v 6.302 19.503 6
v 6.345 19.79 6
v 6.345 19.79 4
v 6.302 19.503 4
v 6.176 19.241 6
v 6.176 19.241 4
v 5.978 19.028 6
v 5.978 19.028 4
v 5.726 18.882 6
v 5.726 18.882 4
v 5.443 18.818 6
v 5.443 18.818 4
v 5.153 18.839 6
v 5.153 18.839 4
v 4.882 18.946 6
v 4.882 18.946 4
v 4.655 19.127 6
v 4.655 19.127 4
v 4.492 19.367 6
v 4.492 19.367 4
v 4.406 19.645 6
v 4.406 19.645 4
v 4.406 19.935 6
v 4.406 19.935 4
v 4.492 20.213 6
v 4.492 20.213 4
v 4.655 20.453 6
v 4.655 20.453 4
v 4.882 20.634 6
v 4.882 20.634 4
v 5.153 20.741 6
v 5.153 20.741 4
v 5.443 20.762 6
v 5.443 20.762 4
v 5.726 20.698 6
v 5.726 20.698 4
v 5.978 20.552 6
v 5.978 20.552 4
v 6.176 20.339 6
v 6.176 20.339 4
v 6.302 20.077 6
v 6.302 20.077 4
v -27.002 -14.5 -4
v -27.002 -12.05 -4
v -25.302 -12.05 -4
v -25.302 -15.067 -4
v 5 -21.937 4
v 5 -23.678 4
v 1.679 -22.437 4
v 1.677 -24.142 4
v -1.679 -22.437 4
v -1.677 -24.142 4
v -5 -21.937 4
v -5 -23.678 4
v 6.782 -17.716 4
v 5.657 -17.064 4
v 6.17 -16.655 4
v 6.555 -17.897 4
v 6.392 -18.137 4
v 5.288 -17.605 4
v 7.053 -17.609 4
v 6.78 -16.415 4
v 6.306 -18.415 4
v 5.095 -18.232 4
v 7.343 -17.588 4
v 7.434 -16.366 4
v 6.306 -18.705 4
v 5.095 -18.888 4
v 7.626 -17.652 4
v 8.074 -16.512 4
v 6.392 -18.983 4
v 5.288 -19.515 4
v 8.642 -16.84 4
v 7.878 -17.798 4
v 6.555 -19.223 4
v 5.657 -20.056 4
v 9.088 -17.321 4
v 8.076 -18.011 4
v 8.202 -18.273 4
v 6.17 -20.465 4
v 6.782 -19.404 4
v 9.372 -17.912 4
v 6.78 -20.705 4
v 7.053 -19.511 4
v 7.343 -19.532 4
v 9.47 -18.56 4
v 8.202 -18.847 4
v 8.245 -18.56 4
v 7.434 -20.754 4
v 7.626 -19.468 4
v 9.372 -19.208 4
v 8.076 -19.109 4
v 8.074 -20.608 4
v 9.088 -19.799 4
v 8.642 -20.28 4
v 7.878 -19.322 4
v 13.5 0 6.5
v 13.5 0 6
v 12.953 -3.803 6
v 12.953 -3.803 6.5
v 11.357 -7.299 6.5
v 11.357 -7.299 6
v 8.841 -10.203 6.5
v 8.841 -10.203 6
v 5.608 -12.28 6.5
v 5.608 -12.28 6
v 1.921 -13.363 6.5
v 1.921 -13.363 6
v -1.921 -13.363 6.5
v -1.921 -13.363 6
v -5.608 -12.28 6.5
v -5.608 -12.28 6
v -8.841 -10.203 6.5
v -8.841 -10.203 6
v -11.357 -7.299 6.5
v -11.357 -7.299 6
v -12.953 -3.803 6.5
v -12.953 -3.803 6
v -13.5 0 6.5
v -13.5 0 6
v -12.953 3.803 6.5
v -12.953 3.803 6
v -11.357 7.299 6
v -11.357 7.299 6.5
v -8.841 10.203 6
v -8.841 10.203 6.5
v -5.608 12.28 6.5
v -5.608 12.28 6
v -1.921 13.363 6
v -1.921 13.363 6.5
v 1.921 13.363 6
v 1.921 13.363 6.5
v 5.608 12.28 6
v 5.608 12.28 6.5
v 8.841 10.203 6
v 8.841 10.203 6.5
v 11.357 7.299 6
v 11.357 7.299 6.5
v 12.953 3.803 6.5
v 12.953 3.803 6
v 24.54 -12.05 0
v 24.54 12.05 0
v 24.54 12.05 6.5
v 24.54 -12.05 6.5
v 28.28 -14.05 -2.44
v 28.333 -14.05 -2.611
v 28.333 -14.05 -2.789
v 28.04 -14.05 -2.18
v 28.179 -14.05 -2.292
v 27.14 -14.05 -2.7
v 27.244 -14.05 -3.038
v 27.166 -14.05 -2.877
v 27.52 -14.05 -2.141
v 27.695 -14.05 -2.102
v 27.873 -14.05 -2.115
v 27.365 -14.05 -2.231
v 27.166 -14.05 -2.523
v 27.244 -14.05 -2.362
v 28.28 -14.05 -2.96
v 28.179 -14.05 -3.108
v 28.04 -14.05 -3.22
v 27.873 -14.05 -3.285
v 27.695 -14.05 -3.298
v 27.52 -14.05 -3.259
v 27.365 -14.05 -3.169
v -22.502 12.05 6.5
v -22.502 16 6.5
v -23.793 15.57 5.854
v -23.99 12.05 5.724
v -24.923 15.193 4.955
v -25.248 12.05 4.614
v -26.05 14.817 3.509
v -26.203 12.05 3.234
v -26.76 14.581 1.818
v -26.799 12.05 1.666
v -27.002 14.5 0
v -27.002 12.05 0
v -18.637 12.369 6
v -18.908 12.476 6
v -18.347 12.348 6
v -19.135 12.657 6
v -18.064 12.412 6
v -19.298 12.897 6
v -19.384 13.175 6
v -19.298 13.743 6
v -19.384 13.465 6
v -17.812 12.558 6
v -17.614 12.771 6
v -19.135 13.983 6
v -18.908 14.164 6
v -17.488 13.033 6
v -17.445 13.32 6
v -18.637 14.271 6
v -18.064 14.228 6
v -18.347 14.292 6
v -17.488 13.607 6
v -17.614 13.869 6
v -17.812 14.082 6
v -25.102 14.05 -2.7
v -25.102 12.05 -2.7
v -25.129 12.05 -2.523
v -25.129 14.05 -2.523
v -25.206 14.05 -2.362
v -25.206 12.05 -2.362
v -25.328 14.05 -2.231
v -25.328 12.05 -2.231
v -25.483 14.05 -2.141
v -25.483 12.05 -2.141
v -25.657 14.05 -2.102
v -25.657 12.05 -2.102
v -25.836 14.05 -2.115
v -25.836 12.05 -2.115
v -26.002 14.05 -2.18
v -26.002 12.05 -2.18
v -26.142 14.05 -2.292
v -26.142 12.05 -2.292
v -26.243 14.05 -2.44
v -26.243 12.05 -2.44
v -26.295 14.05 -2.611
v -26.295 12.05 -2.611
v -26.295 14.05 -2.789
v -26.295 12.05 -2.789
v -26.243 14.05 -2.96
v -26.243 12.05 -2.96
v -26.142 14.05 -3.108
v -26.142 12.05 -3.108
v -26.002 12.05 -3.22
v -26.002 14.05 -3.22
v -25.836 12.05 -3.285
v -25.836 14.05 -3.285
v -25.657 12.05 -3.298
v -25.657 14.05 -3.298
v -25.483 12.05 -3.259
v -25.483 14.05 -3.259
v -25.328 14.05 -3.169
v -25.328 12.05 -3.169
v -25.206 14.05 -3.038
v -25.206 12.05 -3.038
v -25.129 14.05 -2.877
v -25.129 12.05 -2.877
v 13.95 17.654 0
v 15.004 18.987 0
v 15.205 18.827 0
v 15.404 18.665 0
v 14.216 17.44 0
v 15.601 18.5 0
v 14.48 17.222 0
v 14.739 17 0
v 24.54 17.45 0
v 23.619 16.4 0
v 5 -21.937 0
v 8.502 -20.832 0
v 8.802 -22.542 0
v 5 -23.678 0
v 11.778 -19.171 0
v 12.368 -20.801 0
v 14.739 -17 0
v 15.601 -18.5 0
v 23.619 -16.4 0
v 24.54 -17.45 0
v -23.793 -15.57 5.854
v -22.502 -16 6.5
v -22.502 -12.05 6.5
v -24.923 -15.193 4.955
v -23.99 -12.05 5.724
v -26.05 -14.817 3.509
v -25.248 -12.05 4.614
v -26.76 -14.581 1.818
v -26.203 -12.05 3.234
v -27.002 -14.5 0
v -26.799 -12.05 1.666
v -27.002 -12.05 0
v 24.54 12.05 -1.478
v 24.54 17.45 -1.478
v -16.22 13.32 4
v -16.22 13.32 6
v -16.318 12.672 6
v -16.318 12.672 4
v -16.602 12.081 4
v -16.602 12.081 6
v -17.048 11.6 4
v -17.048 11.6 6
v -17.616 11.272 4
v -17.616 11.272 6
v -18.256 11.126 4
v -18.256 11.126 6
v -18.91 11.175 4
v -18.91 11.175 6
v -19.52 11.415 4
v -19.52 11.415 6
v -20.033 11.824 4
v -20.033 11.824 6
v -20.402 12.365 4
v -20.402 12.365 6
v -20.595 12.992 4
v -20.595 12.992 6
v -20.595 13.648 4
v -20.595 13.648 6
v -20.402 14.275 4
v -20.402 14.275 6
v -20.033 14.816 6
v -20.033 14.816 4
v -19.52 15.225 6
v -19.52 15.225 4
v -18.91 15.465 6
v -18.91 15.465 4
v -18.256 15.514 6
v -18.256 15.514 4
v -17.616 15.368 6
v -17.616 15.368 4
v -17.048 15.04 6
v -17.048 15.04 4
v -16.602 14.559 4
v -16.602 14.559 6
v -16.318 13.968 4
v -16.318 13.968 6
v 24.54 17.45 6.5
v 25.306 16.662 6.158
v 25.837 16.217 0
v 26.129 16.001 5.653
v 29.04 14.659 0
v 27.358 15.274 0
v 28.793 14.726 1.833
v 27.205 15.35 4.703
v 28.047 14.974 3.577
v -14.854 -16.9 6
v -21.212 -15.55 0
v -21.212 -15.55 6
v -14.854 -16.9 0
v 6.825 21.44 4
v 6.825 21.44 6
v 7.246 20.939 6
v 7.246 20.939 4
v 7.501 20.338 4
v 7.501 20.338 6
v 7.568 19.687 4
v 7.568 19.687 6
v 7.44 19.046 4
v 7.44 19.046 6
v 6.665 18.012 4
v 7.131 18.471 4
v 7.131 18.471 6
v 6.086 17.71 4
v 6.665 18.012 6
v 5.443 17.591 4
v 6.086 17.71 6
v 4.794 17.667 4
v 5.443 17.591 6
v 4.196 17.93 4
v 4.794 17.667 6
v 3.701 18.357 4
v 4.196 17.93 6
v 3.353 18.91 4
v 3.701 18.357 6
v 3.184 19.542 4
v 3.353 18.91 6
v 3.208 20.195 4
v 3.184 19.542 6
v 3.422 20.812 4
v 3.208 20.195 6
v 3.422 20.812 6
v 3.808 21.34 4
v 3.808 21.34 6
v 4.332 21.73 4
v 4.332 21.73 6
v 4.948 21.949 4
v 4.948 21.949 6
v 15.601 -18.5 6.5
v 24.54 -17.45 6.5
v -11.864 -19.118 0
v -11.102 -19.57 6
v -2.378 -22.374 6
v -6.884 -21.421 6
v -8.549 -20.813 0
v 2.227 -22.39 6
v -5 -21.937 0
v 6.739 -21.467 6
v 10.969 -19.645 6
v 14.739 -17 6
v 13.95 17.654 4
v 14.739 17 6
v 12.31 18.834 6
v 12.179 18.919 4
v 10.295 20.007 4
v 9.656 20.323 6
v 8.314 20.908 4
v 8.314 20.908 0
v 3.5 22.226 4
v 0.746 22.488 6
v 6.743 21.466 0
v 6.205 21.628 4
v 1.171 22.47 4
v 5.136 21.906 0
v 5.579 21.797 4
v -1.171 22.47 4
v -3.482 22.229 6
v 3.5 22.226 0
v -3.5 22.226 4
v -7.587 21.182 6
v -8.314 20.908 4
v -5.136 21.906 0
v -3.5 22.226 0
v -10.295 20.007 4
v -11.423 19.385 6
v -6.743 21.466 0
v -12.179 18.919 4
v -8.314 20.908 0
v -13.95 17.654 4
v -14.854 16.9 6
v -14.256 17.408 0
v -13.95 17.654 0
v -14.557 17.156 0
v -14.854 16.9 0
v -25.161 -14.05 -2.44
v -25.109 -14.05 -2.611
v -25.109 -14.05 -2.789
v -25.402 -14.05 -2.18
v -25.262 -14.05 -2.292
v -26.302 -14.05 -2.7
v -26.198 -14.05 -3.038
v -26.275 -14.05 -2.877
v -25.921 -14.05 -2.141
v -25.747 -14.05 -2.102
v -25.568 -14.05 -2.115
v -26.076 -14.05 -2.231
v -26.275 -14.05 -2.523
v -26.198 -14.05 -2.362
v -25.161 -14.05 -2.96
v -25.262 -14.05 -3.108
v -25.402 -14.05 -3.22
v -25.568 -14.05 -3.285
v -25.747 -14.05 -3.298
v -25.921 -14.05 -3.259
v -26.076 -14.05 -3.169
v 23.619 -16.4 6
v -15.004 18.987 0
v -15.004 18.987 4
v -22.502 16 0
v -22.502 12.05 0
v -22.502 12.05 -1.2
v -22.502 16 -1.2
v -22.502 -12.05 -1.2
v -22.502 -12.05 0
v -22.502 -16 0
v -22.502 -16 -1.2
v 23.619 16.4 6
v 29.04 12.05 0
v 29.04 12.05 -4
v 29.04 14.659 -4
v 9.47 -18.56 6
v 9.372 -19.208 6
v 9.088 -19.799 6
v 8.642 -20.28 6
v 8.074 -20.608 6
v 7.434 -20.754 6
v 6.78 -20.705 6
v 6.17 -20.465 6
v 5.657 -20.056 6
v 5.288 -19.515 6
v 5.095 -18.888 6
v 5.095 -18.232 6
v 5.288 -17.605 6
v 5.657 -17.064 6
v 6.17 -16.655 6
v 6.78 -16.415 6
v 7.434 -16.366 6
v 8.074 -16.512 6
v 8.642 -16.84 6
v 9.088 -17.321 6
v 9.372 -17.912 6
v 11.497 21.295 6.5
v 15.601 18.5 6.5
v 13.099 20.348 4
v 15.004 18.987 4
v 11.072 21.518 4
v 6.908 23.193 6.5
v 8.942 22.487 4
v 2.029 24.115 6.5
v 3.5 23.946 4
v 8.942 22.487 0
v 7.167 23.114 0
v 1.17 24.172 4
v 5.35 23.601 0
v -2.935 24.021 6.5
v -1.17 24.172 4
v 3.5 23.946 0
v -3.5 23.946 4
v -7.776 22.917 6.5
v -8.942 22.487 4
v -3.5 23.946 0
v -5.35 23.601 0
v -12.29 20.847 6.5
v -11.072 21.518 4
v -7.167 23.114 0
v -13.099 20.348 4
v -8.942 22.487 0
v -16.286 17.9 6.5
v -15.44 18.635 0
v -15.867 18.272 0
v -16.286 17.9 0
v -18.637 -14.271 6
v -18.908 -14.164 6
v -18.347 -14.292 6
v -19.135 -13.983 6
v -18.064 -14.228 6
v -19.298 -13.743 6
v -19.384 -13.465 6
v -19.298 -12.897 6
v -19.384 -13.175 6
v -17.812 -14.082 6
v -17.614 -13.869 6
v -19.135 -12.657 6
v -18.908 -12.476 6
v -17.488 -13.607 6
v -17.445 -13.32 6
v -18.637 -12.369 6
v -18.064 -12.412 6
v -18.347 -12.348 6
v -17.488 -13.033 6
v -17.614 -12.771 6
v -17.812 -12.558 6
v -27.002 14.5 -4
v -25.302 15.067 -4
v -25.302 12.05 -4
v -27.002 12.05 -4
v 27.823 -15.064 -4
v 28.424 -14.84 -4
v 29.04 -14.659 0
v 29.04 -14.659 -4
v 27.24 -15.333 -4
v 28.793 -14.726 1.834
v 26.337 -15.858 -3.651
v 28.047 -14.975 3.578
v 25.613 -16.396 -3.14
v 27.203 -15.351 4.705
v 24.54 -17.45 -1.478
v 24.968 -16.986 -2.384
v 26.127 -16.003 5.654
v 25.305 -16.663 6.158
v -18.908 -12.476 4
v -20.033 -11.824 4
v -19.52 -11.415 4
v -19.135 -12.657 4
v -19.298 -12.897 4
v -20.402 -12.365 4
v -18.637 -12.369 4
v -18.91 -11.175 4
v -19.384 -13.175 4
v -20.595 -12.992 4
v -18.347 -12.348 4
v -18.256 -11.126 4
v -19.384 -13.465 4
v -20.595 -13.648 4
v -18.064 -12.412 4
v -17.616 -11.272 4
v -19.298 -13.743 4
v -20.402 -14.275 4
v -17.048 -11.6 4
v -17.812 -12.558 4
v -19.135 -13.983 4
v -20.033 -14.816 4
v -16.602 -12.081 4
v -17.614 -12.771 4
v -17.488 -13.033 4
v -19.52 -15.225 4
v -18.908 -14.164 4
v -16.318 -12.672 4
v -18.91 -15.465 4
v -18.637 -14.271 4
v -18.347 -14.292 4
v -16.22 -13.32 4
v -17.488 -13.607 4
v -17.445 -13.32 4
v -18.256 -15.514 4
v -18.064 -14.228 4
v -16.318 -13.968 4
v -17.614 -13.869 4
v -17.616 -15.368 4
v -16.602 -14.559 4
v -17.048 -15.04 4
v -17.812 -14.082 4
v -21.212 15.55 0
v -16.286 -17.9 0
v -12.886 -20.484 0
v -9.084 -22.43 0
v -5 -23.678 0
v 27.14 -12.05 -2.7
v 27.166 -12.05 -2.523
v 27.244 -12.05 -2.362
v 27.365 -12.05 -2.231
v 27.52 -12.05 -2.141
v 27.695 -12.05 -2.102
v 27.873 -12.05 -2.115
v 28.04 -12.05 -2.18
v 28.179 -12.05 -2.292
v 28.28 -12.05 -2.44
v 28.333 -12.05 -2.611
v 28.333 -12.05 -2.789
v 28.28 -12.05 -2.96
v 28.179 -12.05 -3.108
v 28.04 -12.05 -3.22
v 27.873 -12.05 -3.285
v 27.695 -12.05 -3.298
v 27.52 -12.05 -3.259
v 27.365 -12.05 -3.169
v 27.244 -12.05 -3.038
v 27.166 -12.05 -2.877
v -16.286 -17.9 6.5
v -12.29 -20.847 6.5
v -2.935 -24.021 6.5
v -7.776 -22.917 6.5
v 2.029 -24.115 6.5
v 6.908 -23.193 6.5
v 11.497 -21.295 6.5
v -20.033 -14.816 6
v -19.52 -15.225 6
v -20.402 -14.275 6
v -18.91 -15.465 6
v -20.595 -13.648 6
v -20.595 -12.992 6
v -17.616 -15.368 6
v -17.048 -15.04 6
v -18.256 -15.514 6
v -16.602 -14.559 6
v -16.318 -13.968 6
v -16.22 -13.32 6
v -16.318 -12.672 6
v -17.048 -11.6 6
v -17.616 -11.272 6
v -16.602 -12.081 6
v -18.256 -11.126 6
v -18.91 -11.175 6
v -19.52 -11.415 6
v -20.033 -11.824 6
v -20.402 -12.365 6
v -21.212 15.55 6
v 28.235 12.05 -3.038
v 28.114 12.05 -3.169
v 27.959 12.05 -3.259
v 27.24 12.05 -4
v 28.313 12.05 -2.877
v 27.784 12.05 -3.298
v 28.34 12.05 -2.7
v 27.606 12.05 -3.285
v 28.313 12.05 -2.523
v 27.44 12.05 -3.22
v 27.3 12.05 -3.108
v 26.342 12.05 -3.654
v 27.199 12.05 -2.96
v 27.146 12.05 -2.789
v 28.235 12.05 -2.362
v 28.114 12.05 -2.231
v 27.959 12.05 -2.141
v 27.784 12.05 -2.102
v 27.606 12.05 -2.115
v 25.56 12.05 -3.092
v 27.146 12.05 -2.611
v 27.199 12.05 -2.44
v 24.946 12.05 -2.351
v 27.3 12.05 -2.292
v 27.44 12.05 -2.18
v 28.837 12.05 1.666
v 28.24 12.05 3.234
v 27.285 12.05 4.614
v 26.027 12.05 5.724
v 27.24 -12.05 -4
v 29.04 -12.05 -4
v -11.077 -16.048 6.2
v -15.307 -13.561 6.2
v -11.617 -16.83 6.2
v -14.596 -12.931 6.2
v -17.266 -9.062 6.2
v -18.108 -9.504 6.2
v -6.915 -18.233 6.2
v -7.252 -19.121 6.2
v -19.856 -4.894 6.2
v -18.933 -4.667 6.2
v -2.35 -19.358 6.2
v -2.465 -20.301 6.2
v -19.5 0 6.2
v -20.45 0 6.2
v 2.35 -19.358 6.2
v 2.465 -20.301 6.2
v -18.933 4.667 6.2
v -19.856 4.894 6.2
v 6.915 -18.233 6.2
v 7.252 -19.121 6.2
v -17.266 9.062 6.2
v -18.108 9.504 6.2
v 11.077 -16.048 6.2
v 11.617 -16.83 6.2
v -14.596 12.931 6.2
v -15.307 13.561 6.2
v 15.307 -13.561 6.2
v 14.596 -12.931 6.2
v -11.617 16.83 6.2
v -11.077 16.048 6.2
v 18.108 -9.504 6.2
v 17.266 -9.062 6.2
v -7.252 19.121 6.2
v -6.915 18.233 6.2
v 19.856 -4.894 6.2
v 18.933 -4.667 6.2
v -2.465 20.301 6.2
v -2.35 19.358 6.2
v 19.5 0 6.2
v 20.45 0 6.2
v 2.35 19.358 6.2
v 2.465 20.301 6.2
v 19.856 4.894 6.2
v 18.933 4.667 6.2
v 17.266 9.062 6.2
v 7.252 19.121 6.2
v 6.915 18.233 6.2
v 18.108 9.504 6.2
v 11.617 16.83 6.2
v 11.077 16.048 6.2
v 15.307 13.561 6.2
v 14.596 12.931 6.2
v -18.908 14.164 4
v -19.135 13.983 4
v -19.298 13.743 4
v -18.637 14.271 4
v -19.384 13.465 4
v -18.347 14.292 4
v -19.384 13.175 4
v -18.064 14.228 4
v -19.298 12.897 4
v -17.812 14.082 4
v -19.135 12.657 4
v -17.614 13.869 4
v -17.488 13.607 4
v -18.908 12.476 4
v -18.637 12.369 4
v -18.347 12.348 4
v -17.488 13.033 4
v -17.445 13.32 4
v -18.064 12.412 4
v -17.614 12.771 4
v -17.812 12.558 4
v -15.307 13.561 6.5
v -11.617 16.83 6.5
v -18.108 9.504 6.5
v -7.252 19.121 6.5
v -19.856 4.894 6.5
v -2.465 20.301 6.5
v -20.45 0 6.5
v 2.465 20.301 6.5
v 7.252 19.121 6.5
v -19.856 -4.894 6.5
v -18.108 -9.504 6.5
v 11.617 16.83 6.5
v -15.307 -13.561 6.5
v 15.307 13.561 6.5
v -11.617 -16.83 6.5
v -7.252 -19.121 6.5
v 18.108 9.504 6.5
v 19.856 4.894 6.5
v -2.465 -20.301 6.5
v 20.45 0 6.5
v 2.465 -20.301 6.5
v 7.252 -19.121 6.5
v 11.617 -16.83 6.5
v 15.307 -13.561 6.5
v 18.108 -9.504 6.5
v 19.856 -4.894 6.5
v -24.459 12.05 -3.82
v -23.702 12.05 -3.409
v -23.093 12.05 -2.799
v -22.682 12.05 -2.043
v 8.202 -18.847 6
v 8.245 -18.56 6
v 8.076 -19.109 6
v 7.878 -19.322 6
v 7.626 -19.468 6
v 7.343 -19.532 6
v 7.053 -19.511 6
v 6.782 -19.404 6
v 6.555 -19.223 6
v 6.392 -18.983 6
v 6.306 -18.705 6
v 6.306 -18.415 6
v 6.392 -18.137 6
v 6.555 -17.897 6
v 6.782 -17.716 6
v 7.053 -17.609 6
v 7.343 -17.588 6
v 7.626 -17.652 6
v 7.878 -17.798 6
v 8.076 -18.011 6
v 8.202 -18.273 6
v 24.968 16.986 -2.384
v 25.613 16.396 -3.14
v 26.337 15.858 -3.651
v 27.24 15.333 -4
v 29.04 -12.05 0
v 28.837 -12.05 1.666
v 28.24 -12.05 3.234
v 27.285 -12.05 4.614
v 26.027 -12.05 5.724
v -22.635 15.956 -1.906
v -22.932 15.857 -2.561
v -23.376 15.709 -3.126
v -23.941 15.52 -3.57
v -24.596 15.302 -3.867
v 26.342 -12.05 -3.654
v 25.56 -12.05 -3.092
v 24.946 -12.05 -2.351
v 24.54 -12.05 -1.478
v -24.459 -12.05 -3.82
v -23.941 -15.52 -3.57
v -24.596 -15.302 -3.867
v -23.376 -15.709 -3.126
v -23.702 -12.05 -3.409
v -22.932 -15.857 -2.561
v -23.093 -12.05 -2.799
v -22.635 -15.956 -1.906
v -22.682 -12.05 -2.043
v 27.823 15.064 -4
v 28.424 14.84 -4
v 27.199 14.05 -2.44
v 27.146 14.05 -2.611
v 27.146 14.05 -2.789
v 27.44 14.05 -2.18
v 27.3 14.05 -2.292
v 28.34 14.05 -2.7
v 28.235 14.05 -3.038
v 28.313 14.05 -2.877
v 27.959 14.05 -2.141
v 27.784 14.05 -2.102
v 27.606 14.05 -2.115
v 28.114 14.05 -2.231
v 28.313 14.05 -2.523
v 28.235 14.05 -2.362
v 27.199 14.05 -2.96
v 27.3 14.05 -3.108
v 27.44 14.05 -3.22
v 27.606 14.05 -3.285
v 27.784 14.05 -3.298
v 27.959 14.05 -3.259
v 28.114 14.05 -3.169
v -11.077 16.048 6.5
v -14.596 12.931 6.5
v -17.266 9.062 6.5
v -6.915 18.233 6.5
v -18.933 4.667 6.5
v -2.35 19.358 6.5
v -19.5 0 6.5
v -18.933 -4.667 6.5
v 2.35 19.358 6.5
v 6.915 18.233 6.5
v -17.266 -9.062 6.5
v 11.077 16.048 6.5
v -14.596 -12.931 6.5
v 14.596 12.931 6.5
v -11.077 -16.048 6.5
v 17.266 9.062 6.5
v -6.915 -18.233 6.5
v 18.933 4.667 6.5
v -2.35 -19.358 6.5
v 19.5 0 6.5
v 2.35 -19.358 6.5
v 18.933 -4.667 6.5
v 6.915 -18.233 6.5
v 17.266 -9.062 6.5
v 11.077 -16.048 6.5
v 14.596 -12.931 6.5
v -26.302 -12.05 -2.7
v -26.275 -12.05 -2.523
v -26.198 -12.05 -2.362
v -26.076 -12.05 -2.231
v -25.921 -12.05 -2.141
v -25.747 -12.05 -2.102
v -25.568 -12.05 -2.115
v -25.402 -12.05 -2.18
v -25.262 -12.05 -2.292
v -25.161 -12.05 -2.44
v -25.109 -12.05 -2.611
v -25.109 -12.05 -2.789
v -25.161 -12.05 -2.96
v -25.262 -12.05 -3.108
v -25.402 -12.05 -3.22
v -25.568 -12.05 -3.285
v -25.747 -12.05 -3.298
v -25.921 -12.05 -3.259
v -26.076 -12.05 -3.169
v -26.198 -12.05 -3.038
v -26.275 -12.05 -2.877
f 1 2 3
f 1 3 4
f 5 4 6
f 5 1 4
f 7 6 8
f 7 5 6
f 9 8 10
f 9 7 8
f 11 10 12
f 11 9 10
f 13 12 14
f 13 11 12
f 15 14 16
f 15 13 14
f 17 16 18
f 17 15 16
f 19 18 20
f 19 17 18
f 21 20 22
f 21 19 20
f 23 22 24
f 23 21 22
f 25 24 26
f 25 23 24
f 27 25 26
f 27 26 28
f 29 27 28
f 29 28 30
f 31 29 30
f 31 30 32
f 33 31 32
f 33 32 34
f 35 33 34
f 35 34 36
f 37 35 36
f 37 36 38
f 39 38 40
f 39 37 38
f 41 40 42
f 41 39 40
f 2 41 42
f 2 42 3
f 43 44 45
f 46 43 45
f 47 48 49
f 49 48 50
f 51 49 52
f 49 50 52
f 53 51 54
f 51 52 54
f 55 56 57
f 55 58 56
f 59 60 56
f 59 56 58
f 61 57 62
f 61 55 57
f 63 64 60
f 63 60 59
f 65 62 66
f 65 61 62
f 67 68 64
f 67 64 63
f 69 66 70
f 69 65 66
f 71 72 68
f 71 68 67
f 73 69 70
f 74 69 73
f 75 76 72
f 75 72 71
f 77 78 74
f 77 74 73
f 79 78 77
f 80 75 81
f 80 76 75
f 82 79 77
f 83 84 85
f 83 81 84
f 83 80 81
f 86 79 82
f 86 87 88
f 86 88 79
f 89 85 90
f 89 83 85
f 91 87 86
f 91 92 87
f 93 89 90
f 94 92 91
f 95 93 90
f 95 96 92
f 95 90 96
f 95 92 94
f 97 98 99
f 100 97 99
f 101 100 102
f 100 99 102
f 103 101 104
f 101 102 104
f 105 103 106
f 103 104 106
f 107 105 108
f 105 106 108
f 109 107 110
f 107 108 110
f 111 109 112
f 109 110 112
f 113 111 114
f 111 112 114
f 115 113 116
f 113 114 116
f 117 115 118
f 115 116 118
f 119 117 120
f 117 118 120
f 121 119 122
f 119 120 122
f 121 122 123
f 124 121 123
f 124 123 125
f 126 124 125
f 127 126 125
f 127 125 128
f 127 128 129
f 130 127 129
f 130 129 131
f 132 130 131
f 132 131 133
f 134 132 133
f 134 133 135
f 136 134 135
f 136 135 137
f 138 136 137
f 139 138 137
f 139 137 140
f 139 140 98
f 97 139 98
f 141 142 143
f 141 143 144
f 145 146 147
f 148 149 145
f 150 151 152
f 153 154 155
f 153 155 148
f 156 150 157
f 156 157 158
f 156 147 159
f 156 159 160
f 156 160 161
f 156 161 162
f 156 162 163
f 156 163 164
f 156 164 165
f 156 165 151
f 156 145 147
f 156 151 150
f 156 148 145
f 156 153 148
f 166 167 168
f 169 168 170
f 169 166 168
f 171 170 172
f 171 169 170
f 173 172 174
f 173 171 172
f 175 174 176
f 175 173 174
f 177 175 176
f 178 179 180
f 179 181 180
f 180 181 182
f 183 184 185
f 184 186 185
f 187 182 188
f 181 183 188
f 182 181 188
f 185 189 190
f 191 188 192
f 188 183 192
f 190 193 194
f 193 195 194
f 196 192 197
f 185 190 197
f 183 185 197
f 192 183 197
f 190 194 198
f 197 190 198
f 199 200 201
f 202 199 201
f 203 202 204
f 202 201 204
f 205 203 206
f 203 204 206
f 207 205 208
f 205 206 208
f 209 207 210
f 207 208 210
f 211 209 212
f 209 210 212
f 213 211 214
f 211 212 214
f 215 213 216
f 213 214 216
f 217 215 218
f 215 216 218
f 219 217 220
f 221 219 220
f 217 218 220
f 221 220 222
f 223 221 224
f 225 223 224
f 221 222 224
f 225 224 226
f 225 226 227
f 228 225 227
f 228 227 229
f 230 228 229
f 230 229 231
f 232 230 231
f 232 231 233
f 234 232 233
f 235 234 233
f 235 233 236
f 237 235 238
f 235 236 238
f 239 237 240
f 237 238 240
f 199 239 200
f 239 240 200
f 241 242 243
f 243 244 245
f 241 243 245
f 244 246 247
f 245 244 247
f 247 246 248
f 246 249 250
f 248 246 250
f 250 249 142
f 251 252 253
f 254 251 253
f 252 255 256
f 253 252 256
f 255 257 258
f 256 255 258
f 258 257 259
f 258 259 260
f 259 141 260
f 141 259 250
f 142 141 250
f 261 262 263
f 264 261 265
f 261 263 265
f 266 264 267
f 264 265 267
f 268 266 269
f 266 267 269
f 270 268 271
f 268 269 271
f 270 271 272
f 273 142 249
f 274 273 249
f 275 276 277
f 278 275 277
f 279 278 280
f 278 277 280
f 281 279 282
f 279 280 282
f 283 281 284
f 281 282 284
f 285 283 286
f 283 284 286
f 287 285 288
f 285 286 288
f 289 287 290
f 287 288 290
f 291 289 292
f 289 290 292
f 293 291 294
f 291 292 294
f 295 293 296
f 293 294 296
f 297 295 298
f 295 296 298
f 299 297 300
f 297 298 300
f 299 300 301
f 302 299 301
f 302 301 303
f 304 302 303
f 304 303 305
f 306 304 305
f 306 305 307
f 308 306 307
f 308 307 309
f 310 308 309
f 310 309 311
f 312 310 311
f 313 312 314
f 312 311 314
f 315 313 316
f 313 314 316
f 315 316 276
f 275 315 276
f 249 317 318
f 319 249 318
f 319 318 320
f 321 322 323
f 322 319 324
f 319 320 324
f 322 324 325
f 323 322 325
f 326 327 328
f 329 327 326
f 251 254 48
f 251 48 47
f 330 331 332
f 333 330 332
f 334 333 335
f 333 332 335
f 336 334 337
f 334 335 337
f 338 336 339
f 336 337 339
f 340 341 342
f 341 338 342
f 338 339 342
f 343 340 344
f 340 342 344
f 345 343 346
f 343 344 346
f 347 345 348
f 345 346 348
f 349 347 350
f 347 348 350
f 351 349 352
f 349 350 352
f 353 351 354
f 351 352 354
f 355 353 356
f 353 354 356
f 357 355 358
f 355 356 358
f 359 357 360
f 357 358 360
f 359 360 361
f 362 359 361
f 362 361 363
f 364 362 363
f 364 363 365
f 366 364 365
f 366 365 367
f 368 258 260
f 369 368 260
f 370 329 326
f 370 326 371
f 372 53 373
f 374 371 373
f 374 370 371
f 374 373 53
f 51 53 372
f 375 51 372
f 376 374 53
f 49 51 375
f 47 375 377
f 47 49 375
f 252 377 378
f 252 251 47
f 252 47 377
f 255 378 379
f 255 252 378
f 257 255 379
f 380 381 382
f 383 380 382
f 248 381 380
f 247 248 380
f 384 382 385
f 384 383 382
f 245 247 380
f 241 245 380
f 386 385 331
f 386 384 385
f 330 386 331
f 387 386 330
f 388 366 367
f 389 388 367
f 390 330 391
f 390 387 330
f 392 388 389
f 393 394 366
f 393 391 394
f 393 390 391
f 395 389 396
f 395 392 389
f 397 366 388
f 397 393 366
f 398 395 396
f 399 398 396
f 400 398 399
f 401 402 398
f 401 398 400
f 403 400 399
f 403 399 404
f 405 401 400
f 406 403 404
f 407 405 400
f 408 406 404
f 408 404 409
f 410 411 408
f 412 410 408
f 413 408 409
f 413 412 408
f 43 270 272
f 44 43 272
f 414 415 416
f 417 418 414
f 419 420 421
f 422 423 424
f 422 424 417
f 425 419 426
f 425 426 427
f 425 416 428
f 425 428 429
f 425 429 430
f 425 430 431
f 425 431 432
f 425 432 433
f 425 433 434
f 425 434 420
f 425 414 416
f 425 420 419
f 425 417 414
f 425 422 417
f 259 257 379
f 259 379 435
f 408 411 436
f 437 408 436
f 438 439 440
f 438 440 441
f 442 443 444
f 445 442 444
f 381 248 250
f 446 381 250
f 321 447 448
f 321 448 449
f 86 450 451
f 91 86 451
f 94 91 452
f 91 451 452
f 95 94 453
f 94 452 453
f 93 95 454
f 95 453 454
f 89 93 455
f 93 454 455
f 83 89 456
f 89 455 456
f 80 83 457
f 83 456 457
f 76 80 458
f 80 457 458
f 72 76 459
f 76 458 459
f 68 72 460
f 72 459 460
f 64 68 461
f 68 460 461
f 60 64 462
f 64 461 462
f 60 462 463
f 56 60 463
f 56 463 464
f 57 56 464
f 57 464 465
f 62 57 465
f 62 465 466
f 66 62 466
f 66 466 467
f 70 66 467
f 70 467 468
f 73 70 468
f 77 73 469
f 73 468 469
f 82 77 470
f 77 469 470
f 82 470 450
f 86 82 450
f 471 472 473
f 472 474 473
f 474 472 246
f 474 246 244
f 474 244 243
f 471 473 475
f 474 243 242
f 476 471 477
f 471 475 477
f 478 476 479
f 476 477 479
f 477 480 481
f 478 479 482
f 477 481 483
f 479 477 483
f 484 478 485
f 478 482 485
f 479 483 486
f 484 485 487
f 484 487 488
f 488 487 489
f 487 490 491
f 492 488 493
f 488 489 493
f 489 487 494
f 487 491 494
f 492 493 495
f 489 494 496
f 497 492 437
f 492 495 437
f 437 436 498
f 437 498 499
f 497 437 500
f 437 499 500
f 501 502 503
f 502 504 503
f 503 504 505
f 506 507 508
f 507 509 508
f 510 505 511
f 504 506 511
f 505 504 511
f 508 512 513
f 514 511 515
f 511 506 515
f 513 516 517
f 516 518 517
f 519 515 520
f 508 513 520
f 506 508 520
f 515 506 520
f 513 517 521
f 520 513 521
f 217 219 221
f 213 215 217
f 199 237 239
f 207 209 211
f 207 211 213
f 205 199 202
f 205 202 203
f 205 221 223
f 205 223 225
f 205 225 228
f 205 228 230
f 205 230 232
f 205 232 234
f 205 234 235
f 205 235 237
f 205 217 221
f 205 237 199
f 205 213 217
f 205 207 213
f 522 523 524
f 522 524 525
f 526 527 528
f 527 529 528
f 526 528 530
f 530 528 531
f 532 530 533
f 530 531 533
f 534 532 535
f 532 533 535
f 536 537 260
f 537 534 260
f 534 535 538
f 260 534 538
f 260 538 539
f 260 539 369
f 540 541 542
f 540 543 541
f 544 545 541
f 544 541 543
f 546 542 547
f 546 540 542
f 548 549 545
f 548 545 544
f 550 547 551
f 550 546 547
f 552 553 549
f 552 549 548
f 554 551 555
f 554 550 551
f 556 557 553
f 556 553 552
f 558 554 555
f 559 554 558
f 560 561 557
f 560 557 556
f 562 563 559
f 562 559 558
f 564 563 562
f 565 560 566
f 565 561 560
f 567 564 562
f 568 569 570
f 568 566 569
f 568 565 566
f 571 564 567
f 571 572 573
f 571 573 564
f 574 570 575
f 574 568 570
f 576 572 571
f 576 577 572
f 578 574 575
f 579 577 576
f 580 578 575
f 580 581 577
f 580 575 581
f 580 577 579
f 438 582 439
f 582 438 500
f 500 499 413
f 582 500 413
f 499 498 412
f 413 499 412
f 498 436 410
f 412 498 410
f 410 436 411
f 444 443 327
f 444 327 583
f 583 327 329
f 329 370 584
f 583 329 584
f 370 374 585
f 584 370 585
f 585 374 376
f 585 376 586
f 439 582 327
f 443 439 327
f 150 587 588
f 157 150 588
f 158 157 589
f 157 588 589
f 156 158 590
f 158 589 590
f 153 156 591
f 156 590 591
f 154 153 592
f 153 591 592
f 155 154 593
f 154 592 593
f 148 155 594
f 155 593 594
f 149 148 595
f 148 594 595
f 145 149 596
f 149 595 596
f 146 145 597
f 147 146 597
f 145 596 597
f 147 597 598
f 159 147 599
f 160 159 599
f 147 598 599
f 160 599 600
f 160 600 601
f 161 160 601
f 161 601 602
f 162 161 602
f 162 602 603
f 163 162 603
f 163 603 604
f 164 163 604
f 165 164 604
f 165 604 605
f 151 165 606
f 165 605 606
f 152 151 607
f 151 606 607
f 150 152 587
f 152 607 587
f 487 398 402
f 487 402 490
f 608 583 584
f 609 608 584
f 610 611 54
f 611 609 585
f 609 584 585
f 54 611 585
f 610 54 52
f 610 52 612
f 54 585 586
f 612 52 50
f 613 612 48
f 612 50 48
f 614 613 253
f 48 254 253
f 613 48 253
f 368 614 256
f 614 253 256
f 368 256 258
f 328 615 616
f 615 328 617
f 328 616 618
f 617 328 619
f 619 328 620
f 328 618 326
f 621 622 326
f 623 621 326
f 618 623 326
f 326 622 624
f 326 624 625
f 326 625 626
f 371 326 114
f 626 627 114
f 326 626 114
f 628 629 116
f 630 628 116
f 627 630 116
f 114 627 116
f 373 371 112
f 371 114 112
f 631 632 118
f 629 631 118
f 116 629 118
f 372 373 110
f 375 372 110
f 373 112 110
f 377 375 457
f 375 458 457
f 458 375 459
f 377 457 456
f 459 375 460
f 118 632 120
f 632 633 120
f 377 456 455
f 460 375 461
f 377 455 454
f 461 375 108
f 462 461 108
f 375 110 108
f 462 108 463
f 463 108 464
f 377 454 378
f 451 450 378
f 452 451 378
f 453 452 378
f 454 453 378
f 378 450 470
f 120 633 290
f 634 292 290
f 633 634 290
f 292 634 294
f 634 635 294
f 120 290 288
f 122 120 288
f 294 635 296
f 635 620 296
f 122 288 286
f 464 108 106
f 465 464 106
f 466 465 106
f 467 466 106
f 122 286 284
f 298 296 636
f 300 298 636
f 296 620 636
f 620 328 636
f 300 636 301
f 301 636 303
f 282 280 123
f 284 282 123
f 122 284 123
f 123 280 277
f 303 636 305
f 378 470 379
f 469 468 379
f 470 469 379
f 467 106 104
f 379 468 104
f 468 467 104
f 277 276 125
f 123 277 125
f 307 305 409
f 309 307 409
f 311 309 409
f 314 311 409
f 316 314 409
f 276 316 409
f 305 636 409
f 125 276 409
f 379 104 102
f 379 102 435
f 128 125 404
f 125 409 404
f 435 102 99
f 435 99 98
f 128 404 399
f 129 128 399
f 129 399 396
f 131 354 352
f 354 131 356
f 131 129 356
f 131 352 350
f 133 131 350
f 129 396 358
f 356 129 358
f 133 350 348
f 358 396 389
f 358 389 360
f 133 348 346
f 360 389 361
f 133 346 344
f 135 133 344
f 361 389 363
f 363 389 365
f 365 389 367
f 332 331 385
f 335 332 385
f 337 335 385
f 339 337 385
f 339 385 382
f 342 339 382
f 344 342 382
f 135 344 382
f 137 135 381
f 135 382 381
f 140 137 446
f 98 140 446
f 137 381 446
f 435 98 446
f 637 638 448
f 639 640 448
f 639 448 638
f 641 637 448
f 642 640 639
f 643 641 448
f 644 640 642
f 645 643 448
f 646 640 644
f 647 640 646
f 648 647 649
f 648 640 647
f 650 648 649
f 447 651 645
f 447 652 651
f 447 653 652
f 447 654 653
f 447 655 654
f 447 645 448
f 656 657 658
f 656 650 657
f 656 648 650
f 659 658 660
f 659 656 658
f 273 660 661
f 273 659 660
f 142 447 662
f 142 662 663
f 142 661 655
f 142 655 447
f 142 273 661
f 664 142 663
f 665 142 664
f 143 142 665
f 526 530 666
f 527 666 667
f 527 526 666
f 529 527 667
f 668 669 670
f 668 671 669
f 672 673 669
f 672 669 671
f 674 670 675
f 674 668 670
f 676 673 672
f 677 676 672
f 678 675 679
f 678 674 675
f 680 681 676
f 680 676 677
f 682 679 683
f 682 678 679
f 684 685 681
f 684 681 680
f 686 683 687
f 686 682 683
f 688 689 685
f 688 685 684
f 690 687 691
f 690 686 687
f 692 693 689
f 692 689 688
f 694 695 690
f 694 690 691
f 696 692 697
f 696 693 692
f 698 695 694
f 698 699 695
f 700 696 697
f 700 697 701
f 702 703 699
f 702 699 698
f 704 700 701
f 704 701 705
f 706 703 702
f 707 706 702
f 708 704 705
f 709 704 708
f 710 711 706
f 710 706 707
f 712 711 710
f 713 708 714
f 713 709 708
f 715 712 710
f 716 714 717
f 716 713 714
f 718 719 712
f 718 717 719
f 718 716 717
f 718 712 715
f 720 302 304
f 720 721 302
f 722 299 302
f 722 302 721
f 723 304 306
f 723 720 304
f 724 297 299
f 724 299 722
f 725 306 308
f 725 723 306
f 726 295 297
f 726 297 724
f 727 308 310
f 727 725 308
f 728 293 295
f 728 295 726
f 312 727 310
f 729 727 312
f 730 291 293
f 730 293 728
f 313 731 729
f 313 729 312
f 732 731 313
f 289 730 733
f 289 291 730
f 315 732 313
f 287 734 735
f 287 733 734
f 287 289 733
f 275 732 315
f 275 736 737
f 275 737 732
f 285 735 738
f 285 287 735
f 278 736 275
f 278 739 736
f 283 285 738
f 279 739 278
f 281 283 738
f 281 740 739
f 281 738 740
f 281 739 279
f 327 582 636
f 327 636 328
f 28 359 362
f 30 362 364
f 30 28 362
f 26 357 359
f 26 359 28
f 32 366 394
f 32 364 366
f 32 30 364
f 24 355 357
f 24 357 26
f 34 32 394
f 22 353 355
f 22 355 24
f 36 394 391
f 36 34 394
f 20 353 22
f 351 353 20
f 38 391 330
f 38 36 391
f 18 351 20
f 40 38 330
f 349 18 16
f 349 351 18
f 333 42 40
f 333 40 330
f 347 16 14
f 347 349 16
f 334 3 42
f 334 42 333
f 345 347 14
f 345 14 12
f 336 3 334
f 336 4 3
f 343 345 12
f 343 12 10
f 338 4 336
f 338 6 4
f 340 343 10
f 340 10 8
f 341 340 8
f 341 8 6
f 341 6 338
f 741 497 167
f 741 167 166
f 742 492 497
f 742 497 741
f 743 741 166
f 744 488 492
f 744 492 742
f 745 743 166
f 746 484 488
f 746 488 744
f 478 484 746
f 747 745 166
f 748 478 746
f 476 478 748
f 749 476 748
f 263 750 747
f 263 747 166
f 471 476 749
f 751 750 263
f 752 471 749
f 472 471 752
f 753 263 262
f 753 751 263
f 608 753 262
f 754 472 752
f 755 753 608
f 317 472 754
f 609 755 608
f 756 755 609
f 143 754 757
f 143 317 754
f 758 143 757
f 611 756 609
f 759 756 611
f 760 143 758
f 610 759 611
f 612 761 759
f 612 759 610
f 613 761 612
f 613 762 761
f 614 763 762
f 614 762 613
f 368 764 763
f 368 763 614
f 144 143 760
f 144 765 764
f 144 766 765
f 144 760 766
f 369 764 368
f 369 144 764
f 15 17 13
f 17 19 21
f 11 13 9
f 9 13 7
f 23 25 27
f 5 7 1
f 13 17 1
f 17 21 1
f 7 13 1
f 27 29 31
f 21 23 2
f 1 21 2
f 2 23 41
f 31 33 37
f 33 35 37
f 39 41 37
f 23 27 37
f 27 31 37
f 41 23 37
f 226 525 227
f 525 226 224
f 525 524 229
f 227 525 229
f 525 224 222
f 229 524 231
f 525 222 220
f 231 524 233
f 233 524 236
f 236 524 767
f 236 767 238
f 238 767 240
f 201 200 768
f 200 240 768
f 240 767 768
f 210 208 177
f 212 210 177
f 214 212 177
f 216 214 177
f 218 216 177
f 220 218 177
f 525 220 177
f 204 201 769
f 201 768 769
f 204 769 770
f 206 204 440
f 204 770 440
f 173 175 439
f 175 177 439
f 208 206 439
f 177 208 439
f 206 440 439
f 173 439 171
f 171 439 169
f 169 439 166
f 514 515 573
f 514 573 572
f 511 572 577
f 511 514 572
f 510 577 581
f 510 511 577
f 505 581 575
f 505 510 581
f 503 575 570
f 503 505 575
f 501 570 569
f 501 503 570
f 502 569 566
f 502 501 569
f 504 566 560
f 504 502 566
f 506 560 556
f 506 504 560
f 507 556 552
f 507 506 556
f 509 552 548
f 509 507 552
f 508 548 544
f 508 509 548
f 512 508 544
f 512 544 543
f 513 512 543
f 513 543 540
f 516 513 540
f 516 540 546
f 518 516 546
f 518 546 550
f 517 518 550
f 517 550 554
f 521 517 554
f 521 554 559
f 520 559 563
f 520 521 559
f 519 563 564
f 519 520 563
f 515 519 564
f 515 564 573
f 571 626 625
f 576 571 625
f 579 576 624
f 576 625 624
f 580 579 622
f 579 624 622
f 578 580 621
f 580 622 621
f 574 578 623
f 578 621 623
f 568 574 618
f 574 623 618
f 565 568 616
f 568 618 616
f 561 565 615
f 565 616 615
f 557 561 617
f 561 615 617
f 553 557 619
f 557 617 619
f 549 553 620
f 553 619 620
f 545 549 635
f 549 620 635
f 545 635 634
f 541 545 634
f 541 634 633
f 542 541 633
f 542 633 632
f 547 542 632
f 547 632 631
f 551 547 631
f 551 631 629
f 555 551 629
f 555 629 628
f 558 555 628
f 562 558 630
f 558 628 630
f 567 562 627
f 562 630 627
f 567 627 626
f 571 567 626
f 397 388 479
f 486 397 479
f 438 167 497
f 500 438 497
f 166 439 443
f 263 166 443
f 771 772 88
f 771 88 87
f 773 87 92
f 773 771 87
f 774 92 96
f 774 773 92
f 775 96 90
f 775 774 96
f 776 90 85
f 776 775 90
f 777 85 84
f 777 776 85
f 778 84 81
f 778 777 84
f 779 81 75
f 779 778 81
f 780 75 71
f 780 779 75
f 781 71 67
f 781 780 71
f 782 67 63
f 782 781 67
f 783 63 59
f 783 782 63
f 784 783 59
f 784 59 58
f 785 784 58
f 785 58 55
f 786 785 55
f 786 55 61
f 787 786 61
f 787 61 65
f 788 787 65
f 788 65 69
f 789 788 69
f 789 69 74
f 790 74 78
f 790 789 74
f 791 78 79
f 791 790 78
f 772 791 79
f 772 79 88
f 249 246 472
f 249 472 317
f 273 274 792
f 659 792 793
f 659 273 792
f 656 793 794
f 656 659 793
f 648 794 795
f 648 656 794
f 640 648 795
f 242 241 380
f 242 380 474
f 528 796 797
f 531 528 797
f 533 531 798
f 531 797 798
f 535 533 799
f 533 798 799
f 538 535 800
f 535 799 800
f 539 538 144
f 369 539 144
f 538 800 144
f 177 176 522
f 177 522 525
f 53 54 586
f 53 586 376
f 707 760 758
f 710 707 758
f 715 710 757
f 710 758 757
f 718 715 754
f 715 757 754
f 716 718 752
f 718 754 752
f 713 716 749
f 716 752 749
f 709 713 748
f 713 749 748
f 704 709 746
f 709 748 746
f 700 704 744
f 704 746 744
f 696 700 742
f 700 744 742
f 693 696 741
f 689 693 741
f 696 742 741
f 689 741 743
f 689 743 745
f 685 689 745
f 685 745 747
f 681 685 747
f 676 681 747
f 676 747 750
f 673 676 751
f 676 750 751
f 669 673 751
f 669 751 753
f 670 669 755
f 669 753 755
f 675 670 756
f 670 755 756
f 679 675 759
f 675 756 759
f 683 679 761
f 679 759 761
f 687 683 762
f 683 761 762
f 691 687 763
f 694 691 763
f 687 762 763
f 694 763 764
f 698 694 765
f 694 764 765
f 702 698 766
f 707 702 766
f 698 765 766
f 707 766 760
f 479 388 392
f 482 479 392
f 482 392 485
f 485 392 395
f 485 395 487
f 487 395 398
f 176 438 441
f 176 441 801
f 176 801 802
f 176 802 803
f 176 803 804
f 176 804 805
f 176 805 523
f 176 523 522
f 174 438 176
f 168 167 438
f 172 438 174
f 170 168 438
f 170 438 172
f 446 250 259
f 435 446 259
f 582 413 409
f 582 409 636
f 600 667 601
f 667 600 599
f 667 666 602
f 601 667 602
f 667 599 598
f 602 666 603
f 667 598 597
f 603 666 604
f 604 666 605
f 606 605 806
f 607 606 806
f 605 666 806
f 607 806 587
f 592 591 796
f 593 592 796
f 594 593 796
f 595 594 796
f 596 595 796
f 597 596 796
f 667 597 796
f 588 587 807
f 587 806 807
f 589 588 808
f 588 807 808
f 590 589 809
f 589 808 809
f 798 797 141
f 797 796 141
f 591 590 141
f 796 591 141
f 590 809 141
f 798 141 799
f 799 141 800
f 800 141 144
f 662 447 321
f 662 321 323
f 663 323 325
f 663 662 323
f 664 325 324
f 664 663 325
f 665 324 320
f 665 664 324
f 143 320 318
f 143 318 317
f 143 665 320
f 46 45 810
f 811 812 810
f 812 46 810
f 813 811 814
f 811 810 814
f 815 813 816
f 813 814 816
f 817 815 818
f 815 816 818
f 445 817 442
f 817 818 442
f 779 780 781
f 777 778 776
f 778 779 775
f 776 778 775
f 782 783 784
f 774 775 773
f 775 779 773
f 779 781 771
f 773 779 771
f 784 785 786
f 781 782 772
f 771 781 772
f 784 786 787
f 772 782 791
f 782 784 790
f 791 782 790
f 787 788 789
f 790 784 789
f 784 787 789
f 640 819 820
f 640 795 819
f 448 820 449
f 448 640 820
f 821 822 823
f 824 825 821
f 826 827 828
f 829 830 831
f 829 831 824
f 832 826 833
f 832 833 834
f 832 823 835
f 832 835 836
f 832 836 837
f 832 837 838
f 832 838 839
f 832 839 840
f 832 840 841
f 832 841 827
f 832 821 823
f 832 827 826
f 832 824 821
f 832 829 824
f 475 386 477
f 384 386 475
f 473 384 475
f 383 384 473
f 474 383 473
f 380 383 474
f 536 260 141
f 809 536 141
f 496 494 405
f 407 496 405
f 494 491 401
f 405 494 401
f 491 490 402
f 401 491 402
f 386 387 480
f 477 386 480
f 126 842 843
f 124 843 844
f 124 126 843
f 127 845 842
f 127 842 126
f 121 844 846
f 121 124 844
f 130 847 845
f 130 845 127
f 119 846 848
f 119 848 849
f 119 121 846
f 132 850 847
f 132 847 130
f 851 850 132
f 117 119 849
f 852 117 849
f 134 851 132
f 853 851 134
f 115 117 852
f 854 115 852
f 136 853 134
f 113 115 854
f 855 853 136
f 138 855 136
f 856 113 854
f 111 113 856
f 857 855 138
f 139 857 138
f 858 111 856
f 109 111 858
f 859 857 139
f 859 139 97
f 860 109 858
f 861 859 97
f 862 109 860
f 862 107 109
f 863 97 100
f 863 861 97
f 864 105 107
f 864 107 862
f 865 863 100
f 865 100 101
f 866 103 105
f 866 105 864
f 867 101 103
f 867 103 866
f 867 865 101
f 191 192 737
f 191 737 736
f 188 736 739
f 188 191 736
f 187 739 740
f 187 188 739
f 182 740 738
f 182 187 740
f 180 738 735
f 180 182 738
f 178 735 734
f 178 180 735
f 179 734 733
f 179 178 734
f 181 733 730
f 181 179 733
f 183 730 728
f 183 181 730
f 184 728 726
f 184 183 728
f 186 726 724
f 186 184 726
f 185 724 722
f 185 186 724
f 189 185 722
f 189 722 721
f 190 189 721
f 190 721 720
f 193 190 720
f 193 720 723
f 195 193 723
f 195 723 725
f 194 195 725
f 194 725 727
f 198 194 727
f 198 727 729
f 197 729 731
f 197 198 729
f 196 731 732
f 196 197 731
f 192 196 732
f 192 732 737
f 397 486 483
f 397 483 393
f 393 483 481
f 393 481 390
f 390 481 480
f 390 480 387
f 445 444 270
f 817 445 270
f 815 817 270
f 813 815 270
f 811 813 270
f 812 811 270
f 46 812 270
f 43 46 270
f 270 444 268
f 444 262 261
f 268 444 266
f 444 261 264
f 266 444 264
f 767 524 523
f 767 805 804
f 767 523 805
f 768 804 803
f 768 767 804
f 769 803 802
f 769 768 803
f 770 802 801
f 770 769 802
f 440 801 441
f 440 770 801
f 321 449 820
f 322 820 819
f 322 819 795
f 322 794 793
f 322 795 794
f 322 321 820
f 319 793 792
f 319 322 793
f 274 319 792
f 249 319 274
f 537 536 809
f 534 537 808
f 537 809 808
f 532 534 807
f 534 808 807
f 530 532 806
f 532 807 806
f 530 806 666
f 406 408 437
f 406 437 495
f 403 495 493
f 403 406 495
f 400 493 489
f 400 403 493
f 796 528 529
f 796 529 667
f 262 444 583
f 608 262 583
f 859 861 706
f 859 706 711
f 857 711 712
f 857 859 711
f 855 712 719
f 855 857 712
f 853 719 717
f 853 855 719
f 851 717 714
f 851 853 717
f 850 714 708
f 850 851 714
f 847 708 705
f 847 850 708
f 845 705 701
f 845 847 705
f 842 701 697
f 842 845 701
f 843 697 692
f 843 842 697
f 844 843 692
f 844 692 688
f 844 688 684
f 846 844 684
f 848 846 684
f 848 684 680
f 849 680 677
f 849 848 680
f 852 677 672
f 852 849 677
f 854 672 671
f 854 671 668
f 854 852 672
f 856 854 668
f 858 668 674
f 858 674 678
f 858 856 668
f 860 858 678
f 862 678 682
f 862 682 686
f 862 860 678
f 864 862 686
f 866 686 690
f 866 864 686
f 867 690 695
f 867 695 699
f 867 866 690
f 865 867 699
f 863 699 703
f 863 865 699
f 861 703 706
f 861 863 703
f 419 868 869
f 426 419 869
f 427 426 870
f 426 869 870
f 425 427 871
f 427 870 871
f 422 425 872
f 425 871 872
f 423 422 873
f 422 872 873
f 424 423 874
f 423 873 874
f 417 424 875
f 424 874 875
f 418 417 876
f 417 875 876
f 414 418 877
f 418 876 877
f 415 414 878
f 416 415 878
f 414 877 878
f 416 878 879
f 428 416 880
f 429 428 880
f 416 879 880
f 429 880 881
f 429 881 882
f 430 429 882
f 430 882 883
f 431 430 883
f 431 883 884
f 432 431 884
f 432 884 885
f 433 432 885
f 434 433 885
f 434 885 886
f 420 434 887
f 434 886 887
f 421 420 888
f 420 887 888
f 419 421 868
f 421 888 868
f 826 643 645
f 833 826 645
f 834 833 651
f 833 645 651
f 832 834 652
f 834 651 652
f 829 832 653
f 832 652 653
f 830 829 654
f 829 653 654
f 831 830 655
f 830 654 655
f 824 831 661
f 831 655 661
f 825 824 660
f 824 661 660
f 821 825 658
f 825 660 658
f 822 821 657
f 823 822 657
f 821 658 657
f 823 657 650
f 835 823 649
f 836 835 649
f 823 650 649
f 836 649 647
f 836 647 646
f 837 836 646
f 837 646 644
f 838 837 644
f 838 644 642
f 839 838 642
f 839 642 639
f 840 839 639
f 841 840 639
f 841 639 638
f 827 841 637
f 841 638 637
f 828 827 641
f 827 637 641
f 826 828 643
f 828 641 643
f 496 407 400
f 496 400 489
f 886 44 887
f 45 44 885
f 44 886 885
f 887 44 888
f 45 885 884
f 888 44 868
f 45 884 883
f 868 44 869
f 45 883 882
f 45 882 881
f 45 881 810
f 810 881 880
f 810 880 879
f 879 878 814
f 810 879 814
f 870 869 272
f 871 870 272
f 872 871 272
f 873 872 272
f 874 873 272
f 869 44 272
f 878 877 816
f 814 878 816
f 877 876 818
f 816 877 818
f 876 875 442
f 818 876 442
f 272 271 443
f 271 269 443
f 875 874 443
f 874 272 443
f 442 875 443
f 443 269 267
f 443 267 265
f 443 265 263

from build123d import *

# Parameters (mm, degrees)
PAD_DEPTH            = 6.5
POCKET_DEPTH         = 6
SKETCH002_R          = 13.5
POCKET001_DEPTH      = 1
SKETCH003_W          = 5.4
SKETCH003_H          = 6.5
PAD001_DEPTH         = 4.5
POCKET002_DEPTH      = 10
SKETCH010_W          = 3.95
SKETCH010_H          = 6.5
PAD002_DEPTH         = 4.5
POCKET005_DEPTH      = 10
SKETCH014_R          = 20.45
SKETCH014_R_2        = 19.5
POCKET008_DEPTH      = 0.3
SKETCH015_R          = 2.2
SKETCH015_R_2        = 0.975
PAD003_DEPTH         = 2
POCKET009_DEPTH      = 4
POCKET010_DEPTH      = 4
PAD004_DEPTH         = 4
SKETCH019_R          = 0.6
POCKET011_DEPTH      = 2
SKETCH020_R          = 0.6
POCKET012_DEPTH      = 2
POCKET013_DEPTH      = 12.151
POCKET013_DEPTH_BACK = 36.251


with BuildPart() as part:
    # Sketch → Pad (new body)
    with BuildSketch(Plane.XY):
        with BuildLine():
            Line((-22.5019915649, 16), (-22.5019915649, -16))
            Line((-22.5019915649, -16), (-16.2858834578, -17.9))
            ThreePointArc((-16.2858834578, -17.9), (-0.4552796053, -24.1957169863), (15.6009615088, -18.5))
            Line((15.6009615088, -18.5), (24.5395016581, -17.45))
            Line((24.5395016581, 17.45), (24.5395016581, -17.45))
            Line((15.6009615088, 18.5), (24.5395016581, 17.45))
            ThreePointArc((15.6009615088, 18.5), (-0.4552796053, 24.1957169863), (-16.2858834578, 17.9))
            Line((-22.5019915649, 16), (-16.2858834578, 17.9))
        make_face()
    extrude(amount=PAD_DEPTH)

    # Sketch001 → Pocket (cut)
    with BuildSketch(Plane.XY):
        with BuildLine():
            Line((-14.8539557021, 16.9), (-21.2122180433, 15.55))
            Line((-21.2122180433, 15.55), (-21.2122180433, -15.55))
            Line((-21.2122180433, -15.55), (-14.8539557021, -16.9))
            ThreePointArc((-14.8539557021, -16.9), (-0.0760301383, -22.4998715423), (14.739402973, -17))
            Line((14.739402973, -17), (23.6191552218, -16.4))
            Line((23.6191552218, 16.4), (23.6191552218, -16.4))
            Line((14.739402973, 17), (23.6191552218, 16.4))
            ThreePointArc((14.739402973, 17), (-0.0760301383, 22.4998715423), (-14.8539557021, 16.9))
        make_face()
    extrude(amount=POCKET_DEPTH, mode=Mode.SUBTRACT)

    # Sketch002 (on Face19 of Pocket) → Pocket001 (cut)
    with BuildSketch(Plane(origin=(0, 0, 6), x_dir=(1, 0, 0), z_dir=(0, 0, -1))):
        Circle(SKETCH002_R)
    extrude(amount=-POCKET001_DEPTH, mode=Mode.SUBTRACT)

    # Sketch003 (on Face7 of Pad) → Pad001 (join)
    with BuildSketch(Plane.YZ.offset(24.5395016581)):
        with Locations((-14.75, 3.25)):
            Rectangle(SKETCH003_W, SKETCH003_H)
        with Locations((14.75, 3.25)):
            Rectangle(SKETCH003_W, SKETCH003_H)
    extrude(amount=PAD001_DEPTH)

    # Sketch006 (on Face22 of Pad001) → Pocket002 (cut)
    with BuildSketch(Plane.XY.offset(6.5)):
        with BuildLine():
            ThreePointArc((24.5395016581, 17.45), (26.5735685567, 15.7065020586), (29.0395016581, 14.6594169812))
            Line((29.0395016581, 17.45), (29.0395016581, 14.6594169812))
            Line((29.0395016581, 17.45), (24.5395016581, 17.45))
        make_face()
        with BuildLine():
            ThreePointArc((29.0395016581, -14.6594169811), (26.5735685567, -15.7065020586), (24.5395016581, -17.45))
            Line((29.0395016581, -17.45), (24.5395016581, -17.45))
            Line((29.0395016581, -14.6594169811), (29.0395016581, -17.45))
        make_face()
    extrude(amount=-POCKET002_DEPTH, mode=Mode.SUBTRACT)

    # Sketch010 (on Face3 of Pad) → Pad002 (join)
    with BuildSketch(Plane(origin=(-22.5019915649, 0, 0), x_dir=(0, -1, 0), z_dir=(-1, 0, 0))):
        with Locations((-14.025, 3.25)):
            Rectangle(SKETCH010_W, SKETCH010_H)
        with Locations((14.025, 3.25)):
            Rectangle(SKETCH010_W, SKETCH010_H)
    extrude(amount=PAD002_DEPTH)

    # Sketch011 (on Face28 of Pad002) → Pocket005 (cut)
    with BuildSketch(Plane.XY.offset(6.5)):
        Polygon((-27.0019915649, 16), (-22.5019915649, 16), (-27.0019915649, 14.5), align=None)
        Polygon((-22.5019915649, -16), (-27.0019915649, -14.5), (-27.0019915649, -16), align=None)
    extrude(amount=-POCKET005_DEPTH, mode=Mode.SUBTRACT)

    # Sketch014 (on Face10 of Pad) → Pocket008 (cut)
    with BuildSketch(Plane.XY.offset(6.5)):
        Circle(SKETCH014_R)
        Circle(SKETCH014_R_2, mode=Mode.SUBTRACT)
    extrude(amount=-POCKET008_DEPTH, mode=Mode.SUBTRACT)

    # Sketch015 (on Face19 of Pocket) → Pad003 (join)
    with BuildSketch(Plane(origin=(0, 0, 6), x_dir=(1, 0, 0), z_dir=(0, 0, -1))):
        with Locations((-18.42, 13.32)):
            Circle(SKETCH015_R)
        with Locations((-18.42, 13.32)):
            Circle(SKETCH015_R_2, mode=Mode.SUBTRACT)
        with Locations((7.27, 18.56)):
            Circle(SKETCH015_R)
        with Locations((7.27, 18.56)):
            Circle(SKETCH015_R_2, mode=Mode.SUBTRACT)
        with Locations((5.37, -19.79)):
            Circle(SKETCH015_R)
        with Locations((5.37, -19.79)):
            Circle(SKETCH015_R_2, mode=Mode.SUBTRACT)
        with Locations((-18.42, -13.32)):
            Circle(SKETCH015_R)
        with Locations((-18.42, -13.32)):
            Circle(SKETCH015_R_2, mode=Mode.SUBTRACT)
    extrude(amount=PAD003_DEPTH)

    # Sketch016 → Pocket009 (cut)
    with BuildSketch(Plane(origin=(0, 0, 0), x_dir=(-1, 0, 0), z_dir=(0, 0, 1))):
        with BuildLine():
            Line((-5, 23.6778377391), (-5, 21.9374109685))
            ThreePointArc((5, 21.9374109685), (0, 22.5), (-5, 21.9374109685))
            Line((5, 23.6778377391), (5, 21.9374109685))
            ThreePointArc((5, 23.6778377391), (0, 24.2), (-5, 23.6778377391))
        make_face()
    extrude(amount=POCKET009_DEPTH, mode=Mode.SUBTRACT)

    # Sketch017 → Pocket010 (cut)
    with BuildSketch(Plane(origin=(0, 0, 0), x_dir=(-1, 0, 0), z_dir=(0, 0, 1))):
        with BuildLine():
            Line((-3.499984119, -22.2261132717), (-3.5, -23.9455632634))
            ThreePointArc((-3.5, -23.9455632634), (0, -24.2000019575), (3.5, -23.9455632634))
            Line((3.5000158811, -22.2261082701), (3.5, -23.9455632634))
            ThreePointArc((-3.499984119, -22.2261132717), (1.60767e-05, -22.5), (3.5000158811, -22.2261082701))
        make_face()
        with BuildLine():
            ThreePointArc((-13.9498796389, -17.6536358312), (-11.25, -19.4855715851), (-8.3135572795, -20.9077680626))
            Line((-8.3135572795, -20.9077680626), (-8.9416927184, -22.487466094))
            ThreePointArc((-15.0038705449, -18.987466094), (-12.1, -20.9578147716), (-8.9416927184, -22.487466094))
            Line((-13.9498796389, -17.6536358312), (-15.0038705449, -18.987466094))
        make_face()
        with BuildLine():
            ThreePointArc((8.3135572795, -20.9077680626), (11.25, -19.4855715851), (13.9498796389, -17.6536358312))
            Line((13.9498796389, -17.6536358312), (15.0038705449, -18.987466094))
            ThreePointArc((8.9416927184, -22.487466094), (12.1, -20.9578147716), (15.0038705449, -18.987466094))
            Line((8.3135572795, -20.9077680626), (8.9416927184, -22.487466094))
        make_face()
    extrude(amount=POCKET010_DEPTH, mode=Mode.SUBTRACT)

    # Sketch018 (on Face8 of Pocket005) → Pad004 (join)
    with BuildSketch(Plane(origin=(0, 0, 0), x_dir=(1, 0, 0), z_dir=(0, 0, -1))):
        Polygon((-27.0019915649, 14.5), (-27.0019915649, 12.05), (-22.5019915649, 12.05), (-22.5019915649, 16), align=None)
        Polygon((-27.0019915649, -12.05), (-22.5019915649, -12.05), (-22.5019915649, -16), (-27.0019915649, -14.5), align=None)
        with BuildLine():
            Line((24.5395016581, 17.45), (24.5395016581, 12.05))
            Line((29.0395016581, 12.05), (24.5395016581, 12.05))
            Line((29.0395016581, 14.6594169811), (29.0395016581, 12.05))
            ThreePointArc((24.5395016581, 17.45), (26.5735685567, 15.7065020586), (29.0395016581, 14.6594169811))
        make_face()
        with BuildLine():
            Line((24.5395016581, -12.05), (24.5395016581, -17.45))
            ThreePointArc((29.0395016581, -14.6594169811), (26.5735685568, -15.7065020586), (24.5395016581, -17.45))
            Line((29.0395016581, -12.05), (29.0395016581, -14.6594169812))
            Line((24.5395016581, -12.05), (29.0395016581, -12.05))
        make_face()
    extrude(amount=PAD004_DEPTH)

    # Sketch019 (on Face64 of Pad004) → Pocket011 (cut)
    with BuildSketch(Plane.XZ.offset(-12.05)):
        with Locations((27.7395016581, -2.7)):
            Circle(SKETCH019_R)
        with Locations((-25.7019915649, -2.7)):
            Circle(SKETCH019_R)
    extrude(amount=-POCKET011_DEPTH, mode=Mode.SUBTRACT)

    # Sketch020 (on Face50 of Pocket011) → Pocket012 (cut)
    with BuildSketch(Plane(origin=(0, -12.05, 0), x_dir=(-1, 0, 0), z_dir=(0, 1, 0))):
        with Locations((-27.7395016581, -2.7)):
            Circle(SKETCH020_R)
        with Locations((25.7019915649, -2.7)):
            Circle(SKETCH020_R)
    extrude(amount=-POCKET012_DEPTH, mode=Mode.SUBTRACT)

    # Sketch021 (on Face48 of Pocket012) → Pocket013 (cut, two sides)
    with BuildSketch(Plane.XZ.offset(-12.05)) as pocket013_sk:
        with BuildLine():
            ThreePointArc((29.0395016581, 0), (27.8047252112, 3.9528470752), (24.5395016581, 6.5))
            Line((24.5395016581, 6.5), (29.0395016581, 6.5))
            Line((29.0395016581, 6.5), (29.0395016581, 0))
        make_face()
        with BuildLine():
            ThreePointArc((24.5395016581, -1.478433716), (25.560340141, -3.0916708473), (27.2395016581, -4))
            Line((24.5395016581, -4), (27.2395016581, -4))
            Line((24.5395016581, -1.478433716), (24.5395016581, -4))
        make_face()
        with BuildLine():
            ThreePointArc((-22.5019915649, 6.5), (-25.767215118, 3.9528470752), (-27.0019915649, 0))
            Line((-27.0019915649, 6.5), (-27.0019915649, 0))
            Line((-22.5019915649, 6.5), (-27.0019915649, 6.5))
        make_face()
        with BuildLine():
            ThreePointArc((-25.3019915649, -4), (-23.3759624024, -3.1260291625), (-22.5019915649, -1.2))
            Line((-22.5019915649, -1.2), (-22.5019915649, -4))
            Line((-22.5019915649, -4), (-25.3019915649, -4))
        make_face()
    extrude(amount=-POCKET013_DEPTH, mode=Mode.SUBTRACT)
    extrude(pocket013_sk.sketch, amount=POCKET013_DEPTH_BACK, mode=Mode.SUBTRACT)


solid = part.part
